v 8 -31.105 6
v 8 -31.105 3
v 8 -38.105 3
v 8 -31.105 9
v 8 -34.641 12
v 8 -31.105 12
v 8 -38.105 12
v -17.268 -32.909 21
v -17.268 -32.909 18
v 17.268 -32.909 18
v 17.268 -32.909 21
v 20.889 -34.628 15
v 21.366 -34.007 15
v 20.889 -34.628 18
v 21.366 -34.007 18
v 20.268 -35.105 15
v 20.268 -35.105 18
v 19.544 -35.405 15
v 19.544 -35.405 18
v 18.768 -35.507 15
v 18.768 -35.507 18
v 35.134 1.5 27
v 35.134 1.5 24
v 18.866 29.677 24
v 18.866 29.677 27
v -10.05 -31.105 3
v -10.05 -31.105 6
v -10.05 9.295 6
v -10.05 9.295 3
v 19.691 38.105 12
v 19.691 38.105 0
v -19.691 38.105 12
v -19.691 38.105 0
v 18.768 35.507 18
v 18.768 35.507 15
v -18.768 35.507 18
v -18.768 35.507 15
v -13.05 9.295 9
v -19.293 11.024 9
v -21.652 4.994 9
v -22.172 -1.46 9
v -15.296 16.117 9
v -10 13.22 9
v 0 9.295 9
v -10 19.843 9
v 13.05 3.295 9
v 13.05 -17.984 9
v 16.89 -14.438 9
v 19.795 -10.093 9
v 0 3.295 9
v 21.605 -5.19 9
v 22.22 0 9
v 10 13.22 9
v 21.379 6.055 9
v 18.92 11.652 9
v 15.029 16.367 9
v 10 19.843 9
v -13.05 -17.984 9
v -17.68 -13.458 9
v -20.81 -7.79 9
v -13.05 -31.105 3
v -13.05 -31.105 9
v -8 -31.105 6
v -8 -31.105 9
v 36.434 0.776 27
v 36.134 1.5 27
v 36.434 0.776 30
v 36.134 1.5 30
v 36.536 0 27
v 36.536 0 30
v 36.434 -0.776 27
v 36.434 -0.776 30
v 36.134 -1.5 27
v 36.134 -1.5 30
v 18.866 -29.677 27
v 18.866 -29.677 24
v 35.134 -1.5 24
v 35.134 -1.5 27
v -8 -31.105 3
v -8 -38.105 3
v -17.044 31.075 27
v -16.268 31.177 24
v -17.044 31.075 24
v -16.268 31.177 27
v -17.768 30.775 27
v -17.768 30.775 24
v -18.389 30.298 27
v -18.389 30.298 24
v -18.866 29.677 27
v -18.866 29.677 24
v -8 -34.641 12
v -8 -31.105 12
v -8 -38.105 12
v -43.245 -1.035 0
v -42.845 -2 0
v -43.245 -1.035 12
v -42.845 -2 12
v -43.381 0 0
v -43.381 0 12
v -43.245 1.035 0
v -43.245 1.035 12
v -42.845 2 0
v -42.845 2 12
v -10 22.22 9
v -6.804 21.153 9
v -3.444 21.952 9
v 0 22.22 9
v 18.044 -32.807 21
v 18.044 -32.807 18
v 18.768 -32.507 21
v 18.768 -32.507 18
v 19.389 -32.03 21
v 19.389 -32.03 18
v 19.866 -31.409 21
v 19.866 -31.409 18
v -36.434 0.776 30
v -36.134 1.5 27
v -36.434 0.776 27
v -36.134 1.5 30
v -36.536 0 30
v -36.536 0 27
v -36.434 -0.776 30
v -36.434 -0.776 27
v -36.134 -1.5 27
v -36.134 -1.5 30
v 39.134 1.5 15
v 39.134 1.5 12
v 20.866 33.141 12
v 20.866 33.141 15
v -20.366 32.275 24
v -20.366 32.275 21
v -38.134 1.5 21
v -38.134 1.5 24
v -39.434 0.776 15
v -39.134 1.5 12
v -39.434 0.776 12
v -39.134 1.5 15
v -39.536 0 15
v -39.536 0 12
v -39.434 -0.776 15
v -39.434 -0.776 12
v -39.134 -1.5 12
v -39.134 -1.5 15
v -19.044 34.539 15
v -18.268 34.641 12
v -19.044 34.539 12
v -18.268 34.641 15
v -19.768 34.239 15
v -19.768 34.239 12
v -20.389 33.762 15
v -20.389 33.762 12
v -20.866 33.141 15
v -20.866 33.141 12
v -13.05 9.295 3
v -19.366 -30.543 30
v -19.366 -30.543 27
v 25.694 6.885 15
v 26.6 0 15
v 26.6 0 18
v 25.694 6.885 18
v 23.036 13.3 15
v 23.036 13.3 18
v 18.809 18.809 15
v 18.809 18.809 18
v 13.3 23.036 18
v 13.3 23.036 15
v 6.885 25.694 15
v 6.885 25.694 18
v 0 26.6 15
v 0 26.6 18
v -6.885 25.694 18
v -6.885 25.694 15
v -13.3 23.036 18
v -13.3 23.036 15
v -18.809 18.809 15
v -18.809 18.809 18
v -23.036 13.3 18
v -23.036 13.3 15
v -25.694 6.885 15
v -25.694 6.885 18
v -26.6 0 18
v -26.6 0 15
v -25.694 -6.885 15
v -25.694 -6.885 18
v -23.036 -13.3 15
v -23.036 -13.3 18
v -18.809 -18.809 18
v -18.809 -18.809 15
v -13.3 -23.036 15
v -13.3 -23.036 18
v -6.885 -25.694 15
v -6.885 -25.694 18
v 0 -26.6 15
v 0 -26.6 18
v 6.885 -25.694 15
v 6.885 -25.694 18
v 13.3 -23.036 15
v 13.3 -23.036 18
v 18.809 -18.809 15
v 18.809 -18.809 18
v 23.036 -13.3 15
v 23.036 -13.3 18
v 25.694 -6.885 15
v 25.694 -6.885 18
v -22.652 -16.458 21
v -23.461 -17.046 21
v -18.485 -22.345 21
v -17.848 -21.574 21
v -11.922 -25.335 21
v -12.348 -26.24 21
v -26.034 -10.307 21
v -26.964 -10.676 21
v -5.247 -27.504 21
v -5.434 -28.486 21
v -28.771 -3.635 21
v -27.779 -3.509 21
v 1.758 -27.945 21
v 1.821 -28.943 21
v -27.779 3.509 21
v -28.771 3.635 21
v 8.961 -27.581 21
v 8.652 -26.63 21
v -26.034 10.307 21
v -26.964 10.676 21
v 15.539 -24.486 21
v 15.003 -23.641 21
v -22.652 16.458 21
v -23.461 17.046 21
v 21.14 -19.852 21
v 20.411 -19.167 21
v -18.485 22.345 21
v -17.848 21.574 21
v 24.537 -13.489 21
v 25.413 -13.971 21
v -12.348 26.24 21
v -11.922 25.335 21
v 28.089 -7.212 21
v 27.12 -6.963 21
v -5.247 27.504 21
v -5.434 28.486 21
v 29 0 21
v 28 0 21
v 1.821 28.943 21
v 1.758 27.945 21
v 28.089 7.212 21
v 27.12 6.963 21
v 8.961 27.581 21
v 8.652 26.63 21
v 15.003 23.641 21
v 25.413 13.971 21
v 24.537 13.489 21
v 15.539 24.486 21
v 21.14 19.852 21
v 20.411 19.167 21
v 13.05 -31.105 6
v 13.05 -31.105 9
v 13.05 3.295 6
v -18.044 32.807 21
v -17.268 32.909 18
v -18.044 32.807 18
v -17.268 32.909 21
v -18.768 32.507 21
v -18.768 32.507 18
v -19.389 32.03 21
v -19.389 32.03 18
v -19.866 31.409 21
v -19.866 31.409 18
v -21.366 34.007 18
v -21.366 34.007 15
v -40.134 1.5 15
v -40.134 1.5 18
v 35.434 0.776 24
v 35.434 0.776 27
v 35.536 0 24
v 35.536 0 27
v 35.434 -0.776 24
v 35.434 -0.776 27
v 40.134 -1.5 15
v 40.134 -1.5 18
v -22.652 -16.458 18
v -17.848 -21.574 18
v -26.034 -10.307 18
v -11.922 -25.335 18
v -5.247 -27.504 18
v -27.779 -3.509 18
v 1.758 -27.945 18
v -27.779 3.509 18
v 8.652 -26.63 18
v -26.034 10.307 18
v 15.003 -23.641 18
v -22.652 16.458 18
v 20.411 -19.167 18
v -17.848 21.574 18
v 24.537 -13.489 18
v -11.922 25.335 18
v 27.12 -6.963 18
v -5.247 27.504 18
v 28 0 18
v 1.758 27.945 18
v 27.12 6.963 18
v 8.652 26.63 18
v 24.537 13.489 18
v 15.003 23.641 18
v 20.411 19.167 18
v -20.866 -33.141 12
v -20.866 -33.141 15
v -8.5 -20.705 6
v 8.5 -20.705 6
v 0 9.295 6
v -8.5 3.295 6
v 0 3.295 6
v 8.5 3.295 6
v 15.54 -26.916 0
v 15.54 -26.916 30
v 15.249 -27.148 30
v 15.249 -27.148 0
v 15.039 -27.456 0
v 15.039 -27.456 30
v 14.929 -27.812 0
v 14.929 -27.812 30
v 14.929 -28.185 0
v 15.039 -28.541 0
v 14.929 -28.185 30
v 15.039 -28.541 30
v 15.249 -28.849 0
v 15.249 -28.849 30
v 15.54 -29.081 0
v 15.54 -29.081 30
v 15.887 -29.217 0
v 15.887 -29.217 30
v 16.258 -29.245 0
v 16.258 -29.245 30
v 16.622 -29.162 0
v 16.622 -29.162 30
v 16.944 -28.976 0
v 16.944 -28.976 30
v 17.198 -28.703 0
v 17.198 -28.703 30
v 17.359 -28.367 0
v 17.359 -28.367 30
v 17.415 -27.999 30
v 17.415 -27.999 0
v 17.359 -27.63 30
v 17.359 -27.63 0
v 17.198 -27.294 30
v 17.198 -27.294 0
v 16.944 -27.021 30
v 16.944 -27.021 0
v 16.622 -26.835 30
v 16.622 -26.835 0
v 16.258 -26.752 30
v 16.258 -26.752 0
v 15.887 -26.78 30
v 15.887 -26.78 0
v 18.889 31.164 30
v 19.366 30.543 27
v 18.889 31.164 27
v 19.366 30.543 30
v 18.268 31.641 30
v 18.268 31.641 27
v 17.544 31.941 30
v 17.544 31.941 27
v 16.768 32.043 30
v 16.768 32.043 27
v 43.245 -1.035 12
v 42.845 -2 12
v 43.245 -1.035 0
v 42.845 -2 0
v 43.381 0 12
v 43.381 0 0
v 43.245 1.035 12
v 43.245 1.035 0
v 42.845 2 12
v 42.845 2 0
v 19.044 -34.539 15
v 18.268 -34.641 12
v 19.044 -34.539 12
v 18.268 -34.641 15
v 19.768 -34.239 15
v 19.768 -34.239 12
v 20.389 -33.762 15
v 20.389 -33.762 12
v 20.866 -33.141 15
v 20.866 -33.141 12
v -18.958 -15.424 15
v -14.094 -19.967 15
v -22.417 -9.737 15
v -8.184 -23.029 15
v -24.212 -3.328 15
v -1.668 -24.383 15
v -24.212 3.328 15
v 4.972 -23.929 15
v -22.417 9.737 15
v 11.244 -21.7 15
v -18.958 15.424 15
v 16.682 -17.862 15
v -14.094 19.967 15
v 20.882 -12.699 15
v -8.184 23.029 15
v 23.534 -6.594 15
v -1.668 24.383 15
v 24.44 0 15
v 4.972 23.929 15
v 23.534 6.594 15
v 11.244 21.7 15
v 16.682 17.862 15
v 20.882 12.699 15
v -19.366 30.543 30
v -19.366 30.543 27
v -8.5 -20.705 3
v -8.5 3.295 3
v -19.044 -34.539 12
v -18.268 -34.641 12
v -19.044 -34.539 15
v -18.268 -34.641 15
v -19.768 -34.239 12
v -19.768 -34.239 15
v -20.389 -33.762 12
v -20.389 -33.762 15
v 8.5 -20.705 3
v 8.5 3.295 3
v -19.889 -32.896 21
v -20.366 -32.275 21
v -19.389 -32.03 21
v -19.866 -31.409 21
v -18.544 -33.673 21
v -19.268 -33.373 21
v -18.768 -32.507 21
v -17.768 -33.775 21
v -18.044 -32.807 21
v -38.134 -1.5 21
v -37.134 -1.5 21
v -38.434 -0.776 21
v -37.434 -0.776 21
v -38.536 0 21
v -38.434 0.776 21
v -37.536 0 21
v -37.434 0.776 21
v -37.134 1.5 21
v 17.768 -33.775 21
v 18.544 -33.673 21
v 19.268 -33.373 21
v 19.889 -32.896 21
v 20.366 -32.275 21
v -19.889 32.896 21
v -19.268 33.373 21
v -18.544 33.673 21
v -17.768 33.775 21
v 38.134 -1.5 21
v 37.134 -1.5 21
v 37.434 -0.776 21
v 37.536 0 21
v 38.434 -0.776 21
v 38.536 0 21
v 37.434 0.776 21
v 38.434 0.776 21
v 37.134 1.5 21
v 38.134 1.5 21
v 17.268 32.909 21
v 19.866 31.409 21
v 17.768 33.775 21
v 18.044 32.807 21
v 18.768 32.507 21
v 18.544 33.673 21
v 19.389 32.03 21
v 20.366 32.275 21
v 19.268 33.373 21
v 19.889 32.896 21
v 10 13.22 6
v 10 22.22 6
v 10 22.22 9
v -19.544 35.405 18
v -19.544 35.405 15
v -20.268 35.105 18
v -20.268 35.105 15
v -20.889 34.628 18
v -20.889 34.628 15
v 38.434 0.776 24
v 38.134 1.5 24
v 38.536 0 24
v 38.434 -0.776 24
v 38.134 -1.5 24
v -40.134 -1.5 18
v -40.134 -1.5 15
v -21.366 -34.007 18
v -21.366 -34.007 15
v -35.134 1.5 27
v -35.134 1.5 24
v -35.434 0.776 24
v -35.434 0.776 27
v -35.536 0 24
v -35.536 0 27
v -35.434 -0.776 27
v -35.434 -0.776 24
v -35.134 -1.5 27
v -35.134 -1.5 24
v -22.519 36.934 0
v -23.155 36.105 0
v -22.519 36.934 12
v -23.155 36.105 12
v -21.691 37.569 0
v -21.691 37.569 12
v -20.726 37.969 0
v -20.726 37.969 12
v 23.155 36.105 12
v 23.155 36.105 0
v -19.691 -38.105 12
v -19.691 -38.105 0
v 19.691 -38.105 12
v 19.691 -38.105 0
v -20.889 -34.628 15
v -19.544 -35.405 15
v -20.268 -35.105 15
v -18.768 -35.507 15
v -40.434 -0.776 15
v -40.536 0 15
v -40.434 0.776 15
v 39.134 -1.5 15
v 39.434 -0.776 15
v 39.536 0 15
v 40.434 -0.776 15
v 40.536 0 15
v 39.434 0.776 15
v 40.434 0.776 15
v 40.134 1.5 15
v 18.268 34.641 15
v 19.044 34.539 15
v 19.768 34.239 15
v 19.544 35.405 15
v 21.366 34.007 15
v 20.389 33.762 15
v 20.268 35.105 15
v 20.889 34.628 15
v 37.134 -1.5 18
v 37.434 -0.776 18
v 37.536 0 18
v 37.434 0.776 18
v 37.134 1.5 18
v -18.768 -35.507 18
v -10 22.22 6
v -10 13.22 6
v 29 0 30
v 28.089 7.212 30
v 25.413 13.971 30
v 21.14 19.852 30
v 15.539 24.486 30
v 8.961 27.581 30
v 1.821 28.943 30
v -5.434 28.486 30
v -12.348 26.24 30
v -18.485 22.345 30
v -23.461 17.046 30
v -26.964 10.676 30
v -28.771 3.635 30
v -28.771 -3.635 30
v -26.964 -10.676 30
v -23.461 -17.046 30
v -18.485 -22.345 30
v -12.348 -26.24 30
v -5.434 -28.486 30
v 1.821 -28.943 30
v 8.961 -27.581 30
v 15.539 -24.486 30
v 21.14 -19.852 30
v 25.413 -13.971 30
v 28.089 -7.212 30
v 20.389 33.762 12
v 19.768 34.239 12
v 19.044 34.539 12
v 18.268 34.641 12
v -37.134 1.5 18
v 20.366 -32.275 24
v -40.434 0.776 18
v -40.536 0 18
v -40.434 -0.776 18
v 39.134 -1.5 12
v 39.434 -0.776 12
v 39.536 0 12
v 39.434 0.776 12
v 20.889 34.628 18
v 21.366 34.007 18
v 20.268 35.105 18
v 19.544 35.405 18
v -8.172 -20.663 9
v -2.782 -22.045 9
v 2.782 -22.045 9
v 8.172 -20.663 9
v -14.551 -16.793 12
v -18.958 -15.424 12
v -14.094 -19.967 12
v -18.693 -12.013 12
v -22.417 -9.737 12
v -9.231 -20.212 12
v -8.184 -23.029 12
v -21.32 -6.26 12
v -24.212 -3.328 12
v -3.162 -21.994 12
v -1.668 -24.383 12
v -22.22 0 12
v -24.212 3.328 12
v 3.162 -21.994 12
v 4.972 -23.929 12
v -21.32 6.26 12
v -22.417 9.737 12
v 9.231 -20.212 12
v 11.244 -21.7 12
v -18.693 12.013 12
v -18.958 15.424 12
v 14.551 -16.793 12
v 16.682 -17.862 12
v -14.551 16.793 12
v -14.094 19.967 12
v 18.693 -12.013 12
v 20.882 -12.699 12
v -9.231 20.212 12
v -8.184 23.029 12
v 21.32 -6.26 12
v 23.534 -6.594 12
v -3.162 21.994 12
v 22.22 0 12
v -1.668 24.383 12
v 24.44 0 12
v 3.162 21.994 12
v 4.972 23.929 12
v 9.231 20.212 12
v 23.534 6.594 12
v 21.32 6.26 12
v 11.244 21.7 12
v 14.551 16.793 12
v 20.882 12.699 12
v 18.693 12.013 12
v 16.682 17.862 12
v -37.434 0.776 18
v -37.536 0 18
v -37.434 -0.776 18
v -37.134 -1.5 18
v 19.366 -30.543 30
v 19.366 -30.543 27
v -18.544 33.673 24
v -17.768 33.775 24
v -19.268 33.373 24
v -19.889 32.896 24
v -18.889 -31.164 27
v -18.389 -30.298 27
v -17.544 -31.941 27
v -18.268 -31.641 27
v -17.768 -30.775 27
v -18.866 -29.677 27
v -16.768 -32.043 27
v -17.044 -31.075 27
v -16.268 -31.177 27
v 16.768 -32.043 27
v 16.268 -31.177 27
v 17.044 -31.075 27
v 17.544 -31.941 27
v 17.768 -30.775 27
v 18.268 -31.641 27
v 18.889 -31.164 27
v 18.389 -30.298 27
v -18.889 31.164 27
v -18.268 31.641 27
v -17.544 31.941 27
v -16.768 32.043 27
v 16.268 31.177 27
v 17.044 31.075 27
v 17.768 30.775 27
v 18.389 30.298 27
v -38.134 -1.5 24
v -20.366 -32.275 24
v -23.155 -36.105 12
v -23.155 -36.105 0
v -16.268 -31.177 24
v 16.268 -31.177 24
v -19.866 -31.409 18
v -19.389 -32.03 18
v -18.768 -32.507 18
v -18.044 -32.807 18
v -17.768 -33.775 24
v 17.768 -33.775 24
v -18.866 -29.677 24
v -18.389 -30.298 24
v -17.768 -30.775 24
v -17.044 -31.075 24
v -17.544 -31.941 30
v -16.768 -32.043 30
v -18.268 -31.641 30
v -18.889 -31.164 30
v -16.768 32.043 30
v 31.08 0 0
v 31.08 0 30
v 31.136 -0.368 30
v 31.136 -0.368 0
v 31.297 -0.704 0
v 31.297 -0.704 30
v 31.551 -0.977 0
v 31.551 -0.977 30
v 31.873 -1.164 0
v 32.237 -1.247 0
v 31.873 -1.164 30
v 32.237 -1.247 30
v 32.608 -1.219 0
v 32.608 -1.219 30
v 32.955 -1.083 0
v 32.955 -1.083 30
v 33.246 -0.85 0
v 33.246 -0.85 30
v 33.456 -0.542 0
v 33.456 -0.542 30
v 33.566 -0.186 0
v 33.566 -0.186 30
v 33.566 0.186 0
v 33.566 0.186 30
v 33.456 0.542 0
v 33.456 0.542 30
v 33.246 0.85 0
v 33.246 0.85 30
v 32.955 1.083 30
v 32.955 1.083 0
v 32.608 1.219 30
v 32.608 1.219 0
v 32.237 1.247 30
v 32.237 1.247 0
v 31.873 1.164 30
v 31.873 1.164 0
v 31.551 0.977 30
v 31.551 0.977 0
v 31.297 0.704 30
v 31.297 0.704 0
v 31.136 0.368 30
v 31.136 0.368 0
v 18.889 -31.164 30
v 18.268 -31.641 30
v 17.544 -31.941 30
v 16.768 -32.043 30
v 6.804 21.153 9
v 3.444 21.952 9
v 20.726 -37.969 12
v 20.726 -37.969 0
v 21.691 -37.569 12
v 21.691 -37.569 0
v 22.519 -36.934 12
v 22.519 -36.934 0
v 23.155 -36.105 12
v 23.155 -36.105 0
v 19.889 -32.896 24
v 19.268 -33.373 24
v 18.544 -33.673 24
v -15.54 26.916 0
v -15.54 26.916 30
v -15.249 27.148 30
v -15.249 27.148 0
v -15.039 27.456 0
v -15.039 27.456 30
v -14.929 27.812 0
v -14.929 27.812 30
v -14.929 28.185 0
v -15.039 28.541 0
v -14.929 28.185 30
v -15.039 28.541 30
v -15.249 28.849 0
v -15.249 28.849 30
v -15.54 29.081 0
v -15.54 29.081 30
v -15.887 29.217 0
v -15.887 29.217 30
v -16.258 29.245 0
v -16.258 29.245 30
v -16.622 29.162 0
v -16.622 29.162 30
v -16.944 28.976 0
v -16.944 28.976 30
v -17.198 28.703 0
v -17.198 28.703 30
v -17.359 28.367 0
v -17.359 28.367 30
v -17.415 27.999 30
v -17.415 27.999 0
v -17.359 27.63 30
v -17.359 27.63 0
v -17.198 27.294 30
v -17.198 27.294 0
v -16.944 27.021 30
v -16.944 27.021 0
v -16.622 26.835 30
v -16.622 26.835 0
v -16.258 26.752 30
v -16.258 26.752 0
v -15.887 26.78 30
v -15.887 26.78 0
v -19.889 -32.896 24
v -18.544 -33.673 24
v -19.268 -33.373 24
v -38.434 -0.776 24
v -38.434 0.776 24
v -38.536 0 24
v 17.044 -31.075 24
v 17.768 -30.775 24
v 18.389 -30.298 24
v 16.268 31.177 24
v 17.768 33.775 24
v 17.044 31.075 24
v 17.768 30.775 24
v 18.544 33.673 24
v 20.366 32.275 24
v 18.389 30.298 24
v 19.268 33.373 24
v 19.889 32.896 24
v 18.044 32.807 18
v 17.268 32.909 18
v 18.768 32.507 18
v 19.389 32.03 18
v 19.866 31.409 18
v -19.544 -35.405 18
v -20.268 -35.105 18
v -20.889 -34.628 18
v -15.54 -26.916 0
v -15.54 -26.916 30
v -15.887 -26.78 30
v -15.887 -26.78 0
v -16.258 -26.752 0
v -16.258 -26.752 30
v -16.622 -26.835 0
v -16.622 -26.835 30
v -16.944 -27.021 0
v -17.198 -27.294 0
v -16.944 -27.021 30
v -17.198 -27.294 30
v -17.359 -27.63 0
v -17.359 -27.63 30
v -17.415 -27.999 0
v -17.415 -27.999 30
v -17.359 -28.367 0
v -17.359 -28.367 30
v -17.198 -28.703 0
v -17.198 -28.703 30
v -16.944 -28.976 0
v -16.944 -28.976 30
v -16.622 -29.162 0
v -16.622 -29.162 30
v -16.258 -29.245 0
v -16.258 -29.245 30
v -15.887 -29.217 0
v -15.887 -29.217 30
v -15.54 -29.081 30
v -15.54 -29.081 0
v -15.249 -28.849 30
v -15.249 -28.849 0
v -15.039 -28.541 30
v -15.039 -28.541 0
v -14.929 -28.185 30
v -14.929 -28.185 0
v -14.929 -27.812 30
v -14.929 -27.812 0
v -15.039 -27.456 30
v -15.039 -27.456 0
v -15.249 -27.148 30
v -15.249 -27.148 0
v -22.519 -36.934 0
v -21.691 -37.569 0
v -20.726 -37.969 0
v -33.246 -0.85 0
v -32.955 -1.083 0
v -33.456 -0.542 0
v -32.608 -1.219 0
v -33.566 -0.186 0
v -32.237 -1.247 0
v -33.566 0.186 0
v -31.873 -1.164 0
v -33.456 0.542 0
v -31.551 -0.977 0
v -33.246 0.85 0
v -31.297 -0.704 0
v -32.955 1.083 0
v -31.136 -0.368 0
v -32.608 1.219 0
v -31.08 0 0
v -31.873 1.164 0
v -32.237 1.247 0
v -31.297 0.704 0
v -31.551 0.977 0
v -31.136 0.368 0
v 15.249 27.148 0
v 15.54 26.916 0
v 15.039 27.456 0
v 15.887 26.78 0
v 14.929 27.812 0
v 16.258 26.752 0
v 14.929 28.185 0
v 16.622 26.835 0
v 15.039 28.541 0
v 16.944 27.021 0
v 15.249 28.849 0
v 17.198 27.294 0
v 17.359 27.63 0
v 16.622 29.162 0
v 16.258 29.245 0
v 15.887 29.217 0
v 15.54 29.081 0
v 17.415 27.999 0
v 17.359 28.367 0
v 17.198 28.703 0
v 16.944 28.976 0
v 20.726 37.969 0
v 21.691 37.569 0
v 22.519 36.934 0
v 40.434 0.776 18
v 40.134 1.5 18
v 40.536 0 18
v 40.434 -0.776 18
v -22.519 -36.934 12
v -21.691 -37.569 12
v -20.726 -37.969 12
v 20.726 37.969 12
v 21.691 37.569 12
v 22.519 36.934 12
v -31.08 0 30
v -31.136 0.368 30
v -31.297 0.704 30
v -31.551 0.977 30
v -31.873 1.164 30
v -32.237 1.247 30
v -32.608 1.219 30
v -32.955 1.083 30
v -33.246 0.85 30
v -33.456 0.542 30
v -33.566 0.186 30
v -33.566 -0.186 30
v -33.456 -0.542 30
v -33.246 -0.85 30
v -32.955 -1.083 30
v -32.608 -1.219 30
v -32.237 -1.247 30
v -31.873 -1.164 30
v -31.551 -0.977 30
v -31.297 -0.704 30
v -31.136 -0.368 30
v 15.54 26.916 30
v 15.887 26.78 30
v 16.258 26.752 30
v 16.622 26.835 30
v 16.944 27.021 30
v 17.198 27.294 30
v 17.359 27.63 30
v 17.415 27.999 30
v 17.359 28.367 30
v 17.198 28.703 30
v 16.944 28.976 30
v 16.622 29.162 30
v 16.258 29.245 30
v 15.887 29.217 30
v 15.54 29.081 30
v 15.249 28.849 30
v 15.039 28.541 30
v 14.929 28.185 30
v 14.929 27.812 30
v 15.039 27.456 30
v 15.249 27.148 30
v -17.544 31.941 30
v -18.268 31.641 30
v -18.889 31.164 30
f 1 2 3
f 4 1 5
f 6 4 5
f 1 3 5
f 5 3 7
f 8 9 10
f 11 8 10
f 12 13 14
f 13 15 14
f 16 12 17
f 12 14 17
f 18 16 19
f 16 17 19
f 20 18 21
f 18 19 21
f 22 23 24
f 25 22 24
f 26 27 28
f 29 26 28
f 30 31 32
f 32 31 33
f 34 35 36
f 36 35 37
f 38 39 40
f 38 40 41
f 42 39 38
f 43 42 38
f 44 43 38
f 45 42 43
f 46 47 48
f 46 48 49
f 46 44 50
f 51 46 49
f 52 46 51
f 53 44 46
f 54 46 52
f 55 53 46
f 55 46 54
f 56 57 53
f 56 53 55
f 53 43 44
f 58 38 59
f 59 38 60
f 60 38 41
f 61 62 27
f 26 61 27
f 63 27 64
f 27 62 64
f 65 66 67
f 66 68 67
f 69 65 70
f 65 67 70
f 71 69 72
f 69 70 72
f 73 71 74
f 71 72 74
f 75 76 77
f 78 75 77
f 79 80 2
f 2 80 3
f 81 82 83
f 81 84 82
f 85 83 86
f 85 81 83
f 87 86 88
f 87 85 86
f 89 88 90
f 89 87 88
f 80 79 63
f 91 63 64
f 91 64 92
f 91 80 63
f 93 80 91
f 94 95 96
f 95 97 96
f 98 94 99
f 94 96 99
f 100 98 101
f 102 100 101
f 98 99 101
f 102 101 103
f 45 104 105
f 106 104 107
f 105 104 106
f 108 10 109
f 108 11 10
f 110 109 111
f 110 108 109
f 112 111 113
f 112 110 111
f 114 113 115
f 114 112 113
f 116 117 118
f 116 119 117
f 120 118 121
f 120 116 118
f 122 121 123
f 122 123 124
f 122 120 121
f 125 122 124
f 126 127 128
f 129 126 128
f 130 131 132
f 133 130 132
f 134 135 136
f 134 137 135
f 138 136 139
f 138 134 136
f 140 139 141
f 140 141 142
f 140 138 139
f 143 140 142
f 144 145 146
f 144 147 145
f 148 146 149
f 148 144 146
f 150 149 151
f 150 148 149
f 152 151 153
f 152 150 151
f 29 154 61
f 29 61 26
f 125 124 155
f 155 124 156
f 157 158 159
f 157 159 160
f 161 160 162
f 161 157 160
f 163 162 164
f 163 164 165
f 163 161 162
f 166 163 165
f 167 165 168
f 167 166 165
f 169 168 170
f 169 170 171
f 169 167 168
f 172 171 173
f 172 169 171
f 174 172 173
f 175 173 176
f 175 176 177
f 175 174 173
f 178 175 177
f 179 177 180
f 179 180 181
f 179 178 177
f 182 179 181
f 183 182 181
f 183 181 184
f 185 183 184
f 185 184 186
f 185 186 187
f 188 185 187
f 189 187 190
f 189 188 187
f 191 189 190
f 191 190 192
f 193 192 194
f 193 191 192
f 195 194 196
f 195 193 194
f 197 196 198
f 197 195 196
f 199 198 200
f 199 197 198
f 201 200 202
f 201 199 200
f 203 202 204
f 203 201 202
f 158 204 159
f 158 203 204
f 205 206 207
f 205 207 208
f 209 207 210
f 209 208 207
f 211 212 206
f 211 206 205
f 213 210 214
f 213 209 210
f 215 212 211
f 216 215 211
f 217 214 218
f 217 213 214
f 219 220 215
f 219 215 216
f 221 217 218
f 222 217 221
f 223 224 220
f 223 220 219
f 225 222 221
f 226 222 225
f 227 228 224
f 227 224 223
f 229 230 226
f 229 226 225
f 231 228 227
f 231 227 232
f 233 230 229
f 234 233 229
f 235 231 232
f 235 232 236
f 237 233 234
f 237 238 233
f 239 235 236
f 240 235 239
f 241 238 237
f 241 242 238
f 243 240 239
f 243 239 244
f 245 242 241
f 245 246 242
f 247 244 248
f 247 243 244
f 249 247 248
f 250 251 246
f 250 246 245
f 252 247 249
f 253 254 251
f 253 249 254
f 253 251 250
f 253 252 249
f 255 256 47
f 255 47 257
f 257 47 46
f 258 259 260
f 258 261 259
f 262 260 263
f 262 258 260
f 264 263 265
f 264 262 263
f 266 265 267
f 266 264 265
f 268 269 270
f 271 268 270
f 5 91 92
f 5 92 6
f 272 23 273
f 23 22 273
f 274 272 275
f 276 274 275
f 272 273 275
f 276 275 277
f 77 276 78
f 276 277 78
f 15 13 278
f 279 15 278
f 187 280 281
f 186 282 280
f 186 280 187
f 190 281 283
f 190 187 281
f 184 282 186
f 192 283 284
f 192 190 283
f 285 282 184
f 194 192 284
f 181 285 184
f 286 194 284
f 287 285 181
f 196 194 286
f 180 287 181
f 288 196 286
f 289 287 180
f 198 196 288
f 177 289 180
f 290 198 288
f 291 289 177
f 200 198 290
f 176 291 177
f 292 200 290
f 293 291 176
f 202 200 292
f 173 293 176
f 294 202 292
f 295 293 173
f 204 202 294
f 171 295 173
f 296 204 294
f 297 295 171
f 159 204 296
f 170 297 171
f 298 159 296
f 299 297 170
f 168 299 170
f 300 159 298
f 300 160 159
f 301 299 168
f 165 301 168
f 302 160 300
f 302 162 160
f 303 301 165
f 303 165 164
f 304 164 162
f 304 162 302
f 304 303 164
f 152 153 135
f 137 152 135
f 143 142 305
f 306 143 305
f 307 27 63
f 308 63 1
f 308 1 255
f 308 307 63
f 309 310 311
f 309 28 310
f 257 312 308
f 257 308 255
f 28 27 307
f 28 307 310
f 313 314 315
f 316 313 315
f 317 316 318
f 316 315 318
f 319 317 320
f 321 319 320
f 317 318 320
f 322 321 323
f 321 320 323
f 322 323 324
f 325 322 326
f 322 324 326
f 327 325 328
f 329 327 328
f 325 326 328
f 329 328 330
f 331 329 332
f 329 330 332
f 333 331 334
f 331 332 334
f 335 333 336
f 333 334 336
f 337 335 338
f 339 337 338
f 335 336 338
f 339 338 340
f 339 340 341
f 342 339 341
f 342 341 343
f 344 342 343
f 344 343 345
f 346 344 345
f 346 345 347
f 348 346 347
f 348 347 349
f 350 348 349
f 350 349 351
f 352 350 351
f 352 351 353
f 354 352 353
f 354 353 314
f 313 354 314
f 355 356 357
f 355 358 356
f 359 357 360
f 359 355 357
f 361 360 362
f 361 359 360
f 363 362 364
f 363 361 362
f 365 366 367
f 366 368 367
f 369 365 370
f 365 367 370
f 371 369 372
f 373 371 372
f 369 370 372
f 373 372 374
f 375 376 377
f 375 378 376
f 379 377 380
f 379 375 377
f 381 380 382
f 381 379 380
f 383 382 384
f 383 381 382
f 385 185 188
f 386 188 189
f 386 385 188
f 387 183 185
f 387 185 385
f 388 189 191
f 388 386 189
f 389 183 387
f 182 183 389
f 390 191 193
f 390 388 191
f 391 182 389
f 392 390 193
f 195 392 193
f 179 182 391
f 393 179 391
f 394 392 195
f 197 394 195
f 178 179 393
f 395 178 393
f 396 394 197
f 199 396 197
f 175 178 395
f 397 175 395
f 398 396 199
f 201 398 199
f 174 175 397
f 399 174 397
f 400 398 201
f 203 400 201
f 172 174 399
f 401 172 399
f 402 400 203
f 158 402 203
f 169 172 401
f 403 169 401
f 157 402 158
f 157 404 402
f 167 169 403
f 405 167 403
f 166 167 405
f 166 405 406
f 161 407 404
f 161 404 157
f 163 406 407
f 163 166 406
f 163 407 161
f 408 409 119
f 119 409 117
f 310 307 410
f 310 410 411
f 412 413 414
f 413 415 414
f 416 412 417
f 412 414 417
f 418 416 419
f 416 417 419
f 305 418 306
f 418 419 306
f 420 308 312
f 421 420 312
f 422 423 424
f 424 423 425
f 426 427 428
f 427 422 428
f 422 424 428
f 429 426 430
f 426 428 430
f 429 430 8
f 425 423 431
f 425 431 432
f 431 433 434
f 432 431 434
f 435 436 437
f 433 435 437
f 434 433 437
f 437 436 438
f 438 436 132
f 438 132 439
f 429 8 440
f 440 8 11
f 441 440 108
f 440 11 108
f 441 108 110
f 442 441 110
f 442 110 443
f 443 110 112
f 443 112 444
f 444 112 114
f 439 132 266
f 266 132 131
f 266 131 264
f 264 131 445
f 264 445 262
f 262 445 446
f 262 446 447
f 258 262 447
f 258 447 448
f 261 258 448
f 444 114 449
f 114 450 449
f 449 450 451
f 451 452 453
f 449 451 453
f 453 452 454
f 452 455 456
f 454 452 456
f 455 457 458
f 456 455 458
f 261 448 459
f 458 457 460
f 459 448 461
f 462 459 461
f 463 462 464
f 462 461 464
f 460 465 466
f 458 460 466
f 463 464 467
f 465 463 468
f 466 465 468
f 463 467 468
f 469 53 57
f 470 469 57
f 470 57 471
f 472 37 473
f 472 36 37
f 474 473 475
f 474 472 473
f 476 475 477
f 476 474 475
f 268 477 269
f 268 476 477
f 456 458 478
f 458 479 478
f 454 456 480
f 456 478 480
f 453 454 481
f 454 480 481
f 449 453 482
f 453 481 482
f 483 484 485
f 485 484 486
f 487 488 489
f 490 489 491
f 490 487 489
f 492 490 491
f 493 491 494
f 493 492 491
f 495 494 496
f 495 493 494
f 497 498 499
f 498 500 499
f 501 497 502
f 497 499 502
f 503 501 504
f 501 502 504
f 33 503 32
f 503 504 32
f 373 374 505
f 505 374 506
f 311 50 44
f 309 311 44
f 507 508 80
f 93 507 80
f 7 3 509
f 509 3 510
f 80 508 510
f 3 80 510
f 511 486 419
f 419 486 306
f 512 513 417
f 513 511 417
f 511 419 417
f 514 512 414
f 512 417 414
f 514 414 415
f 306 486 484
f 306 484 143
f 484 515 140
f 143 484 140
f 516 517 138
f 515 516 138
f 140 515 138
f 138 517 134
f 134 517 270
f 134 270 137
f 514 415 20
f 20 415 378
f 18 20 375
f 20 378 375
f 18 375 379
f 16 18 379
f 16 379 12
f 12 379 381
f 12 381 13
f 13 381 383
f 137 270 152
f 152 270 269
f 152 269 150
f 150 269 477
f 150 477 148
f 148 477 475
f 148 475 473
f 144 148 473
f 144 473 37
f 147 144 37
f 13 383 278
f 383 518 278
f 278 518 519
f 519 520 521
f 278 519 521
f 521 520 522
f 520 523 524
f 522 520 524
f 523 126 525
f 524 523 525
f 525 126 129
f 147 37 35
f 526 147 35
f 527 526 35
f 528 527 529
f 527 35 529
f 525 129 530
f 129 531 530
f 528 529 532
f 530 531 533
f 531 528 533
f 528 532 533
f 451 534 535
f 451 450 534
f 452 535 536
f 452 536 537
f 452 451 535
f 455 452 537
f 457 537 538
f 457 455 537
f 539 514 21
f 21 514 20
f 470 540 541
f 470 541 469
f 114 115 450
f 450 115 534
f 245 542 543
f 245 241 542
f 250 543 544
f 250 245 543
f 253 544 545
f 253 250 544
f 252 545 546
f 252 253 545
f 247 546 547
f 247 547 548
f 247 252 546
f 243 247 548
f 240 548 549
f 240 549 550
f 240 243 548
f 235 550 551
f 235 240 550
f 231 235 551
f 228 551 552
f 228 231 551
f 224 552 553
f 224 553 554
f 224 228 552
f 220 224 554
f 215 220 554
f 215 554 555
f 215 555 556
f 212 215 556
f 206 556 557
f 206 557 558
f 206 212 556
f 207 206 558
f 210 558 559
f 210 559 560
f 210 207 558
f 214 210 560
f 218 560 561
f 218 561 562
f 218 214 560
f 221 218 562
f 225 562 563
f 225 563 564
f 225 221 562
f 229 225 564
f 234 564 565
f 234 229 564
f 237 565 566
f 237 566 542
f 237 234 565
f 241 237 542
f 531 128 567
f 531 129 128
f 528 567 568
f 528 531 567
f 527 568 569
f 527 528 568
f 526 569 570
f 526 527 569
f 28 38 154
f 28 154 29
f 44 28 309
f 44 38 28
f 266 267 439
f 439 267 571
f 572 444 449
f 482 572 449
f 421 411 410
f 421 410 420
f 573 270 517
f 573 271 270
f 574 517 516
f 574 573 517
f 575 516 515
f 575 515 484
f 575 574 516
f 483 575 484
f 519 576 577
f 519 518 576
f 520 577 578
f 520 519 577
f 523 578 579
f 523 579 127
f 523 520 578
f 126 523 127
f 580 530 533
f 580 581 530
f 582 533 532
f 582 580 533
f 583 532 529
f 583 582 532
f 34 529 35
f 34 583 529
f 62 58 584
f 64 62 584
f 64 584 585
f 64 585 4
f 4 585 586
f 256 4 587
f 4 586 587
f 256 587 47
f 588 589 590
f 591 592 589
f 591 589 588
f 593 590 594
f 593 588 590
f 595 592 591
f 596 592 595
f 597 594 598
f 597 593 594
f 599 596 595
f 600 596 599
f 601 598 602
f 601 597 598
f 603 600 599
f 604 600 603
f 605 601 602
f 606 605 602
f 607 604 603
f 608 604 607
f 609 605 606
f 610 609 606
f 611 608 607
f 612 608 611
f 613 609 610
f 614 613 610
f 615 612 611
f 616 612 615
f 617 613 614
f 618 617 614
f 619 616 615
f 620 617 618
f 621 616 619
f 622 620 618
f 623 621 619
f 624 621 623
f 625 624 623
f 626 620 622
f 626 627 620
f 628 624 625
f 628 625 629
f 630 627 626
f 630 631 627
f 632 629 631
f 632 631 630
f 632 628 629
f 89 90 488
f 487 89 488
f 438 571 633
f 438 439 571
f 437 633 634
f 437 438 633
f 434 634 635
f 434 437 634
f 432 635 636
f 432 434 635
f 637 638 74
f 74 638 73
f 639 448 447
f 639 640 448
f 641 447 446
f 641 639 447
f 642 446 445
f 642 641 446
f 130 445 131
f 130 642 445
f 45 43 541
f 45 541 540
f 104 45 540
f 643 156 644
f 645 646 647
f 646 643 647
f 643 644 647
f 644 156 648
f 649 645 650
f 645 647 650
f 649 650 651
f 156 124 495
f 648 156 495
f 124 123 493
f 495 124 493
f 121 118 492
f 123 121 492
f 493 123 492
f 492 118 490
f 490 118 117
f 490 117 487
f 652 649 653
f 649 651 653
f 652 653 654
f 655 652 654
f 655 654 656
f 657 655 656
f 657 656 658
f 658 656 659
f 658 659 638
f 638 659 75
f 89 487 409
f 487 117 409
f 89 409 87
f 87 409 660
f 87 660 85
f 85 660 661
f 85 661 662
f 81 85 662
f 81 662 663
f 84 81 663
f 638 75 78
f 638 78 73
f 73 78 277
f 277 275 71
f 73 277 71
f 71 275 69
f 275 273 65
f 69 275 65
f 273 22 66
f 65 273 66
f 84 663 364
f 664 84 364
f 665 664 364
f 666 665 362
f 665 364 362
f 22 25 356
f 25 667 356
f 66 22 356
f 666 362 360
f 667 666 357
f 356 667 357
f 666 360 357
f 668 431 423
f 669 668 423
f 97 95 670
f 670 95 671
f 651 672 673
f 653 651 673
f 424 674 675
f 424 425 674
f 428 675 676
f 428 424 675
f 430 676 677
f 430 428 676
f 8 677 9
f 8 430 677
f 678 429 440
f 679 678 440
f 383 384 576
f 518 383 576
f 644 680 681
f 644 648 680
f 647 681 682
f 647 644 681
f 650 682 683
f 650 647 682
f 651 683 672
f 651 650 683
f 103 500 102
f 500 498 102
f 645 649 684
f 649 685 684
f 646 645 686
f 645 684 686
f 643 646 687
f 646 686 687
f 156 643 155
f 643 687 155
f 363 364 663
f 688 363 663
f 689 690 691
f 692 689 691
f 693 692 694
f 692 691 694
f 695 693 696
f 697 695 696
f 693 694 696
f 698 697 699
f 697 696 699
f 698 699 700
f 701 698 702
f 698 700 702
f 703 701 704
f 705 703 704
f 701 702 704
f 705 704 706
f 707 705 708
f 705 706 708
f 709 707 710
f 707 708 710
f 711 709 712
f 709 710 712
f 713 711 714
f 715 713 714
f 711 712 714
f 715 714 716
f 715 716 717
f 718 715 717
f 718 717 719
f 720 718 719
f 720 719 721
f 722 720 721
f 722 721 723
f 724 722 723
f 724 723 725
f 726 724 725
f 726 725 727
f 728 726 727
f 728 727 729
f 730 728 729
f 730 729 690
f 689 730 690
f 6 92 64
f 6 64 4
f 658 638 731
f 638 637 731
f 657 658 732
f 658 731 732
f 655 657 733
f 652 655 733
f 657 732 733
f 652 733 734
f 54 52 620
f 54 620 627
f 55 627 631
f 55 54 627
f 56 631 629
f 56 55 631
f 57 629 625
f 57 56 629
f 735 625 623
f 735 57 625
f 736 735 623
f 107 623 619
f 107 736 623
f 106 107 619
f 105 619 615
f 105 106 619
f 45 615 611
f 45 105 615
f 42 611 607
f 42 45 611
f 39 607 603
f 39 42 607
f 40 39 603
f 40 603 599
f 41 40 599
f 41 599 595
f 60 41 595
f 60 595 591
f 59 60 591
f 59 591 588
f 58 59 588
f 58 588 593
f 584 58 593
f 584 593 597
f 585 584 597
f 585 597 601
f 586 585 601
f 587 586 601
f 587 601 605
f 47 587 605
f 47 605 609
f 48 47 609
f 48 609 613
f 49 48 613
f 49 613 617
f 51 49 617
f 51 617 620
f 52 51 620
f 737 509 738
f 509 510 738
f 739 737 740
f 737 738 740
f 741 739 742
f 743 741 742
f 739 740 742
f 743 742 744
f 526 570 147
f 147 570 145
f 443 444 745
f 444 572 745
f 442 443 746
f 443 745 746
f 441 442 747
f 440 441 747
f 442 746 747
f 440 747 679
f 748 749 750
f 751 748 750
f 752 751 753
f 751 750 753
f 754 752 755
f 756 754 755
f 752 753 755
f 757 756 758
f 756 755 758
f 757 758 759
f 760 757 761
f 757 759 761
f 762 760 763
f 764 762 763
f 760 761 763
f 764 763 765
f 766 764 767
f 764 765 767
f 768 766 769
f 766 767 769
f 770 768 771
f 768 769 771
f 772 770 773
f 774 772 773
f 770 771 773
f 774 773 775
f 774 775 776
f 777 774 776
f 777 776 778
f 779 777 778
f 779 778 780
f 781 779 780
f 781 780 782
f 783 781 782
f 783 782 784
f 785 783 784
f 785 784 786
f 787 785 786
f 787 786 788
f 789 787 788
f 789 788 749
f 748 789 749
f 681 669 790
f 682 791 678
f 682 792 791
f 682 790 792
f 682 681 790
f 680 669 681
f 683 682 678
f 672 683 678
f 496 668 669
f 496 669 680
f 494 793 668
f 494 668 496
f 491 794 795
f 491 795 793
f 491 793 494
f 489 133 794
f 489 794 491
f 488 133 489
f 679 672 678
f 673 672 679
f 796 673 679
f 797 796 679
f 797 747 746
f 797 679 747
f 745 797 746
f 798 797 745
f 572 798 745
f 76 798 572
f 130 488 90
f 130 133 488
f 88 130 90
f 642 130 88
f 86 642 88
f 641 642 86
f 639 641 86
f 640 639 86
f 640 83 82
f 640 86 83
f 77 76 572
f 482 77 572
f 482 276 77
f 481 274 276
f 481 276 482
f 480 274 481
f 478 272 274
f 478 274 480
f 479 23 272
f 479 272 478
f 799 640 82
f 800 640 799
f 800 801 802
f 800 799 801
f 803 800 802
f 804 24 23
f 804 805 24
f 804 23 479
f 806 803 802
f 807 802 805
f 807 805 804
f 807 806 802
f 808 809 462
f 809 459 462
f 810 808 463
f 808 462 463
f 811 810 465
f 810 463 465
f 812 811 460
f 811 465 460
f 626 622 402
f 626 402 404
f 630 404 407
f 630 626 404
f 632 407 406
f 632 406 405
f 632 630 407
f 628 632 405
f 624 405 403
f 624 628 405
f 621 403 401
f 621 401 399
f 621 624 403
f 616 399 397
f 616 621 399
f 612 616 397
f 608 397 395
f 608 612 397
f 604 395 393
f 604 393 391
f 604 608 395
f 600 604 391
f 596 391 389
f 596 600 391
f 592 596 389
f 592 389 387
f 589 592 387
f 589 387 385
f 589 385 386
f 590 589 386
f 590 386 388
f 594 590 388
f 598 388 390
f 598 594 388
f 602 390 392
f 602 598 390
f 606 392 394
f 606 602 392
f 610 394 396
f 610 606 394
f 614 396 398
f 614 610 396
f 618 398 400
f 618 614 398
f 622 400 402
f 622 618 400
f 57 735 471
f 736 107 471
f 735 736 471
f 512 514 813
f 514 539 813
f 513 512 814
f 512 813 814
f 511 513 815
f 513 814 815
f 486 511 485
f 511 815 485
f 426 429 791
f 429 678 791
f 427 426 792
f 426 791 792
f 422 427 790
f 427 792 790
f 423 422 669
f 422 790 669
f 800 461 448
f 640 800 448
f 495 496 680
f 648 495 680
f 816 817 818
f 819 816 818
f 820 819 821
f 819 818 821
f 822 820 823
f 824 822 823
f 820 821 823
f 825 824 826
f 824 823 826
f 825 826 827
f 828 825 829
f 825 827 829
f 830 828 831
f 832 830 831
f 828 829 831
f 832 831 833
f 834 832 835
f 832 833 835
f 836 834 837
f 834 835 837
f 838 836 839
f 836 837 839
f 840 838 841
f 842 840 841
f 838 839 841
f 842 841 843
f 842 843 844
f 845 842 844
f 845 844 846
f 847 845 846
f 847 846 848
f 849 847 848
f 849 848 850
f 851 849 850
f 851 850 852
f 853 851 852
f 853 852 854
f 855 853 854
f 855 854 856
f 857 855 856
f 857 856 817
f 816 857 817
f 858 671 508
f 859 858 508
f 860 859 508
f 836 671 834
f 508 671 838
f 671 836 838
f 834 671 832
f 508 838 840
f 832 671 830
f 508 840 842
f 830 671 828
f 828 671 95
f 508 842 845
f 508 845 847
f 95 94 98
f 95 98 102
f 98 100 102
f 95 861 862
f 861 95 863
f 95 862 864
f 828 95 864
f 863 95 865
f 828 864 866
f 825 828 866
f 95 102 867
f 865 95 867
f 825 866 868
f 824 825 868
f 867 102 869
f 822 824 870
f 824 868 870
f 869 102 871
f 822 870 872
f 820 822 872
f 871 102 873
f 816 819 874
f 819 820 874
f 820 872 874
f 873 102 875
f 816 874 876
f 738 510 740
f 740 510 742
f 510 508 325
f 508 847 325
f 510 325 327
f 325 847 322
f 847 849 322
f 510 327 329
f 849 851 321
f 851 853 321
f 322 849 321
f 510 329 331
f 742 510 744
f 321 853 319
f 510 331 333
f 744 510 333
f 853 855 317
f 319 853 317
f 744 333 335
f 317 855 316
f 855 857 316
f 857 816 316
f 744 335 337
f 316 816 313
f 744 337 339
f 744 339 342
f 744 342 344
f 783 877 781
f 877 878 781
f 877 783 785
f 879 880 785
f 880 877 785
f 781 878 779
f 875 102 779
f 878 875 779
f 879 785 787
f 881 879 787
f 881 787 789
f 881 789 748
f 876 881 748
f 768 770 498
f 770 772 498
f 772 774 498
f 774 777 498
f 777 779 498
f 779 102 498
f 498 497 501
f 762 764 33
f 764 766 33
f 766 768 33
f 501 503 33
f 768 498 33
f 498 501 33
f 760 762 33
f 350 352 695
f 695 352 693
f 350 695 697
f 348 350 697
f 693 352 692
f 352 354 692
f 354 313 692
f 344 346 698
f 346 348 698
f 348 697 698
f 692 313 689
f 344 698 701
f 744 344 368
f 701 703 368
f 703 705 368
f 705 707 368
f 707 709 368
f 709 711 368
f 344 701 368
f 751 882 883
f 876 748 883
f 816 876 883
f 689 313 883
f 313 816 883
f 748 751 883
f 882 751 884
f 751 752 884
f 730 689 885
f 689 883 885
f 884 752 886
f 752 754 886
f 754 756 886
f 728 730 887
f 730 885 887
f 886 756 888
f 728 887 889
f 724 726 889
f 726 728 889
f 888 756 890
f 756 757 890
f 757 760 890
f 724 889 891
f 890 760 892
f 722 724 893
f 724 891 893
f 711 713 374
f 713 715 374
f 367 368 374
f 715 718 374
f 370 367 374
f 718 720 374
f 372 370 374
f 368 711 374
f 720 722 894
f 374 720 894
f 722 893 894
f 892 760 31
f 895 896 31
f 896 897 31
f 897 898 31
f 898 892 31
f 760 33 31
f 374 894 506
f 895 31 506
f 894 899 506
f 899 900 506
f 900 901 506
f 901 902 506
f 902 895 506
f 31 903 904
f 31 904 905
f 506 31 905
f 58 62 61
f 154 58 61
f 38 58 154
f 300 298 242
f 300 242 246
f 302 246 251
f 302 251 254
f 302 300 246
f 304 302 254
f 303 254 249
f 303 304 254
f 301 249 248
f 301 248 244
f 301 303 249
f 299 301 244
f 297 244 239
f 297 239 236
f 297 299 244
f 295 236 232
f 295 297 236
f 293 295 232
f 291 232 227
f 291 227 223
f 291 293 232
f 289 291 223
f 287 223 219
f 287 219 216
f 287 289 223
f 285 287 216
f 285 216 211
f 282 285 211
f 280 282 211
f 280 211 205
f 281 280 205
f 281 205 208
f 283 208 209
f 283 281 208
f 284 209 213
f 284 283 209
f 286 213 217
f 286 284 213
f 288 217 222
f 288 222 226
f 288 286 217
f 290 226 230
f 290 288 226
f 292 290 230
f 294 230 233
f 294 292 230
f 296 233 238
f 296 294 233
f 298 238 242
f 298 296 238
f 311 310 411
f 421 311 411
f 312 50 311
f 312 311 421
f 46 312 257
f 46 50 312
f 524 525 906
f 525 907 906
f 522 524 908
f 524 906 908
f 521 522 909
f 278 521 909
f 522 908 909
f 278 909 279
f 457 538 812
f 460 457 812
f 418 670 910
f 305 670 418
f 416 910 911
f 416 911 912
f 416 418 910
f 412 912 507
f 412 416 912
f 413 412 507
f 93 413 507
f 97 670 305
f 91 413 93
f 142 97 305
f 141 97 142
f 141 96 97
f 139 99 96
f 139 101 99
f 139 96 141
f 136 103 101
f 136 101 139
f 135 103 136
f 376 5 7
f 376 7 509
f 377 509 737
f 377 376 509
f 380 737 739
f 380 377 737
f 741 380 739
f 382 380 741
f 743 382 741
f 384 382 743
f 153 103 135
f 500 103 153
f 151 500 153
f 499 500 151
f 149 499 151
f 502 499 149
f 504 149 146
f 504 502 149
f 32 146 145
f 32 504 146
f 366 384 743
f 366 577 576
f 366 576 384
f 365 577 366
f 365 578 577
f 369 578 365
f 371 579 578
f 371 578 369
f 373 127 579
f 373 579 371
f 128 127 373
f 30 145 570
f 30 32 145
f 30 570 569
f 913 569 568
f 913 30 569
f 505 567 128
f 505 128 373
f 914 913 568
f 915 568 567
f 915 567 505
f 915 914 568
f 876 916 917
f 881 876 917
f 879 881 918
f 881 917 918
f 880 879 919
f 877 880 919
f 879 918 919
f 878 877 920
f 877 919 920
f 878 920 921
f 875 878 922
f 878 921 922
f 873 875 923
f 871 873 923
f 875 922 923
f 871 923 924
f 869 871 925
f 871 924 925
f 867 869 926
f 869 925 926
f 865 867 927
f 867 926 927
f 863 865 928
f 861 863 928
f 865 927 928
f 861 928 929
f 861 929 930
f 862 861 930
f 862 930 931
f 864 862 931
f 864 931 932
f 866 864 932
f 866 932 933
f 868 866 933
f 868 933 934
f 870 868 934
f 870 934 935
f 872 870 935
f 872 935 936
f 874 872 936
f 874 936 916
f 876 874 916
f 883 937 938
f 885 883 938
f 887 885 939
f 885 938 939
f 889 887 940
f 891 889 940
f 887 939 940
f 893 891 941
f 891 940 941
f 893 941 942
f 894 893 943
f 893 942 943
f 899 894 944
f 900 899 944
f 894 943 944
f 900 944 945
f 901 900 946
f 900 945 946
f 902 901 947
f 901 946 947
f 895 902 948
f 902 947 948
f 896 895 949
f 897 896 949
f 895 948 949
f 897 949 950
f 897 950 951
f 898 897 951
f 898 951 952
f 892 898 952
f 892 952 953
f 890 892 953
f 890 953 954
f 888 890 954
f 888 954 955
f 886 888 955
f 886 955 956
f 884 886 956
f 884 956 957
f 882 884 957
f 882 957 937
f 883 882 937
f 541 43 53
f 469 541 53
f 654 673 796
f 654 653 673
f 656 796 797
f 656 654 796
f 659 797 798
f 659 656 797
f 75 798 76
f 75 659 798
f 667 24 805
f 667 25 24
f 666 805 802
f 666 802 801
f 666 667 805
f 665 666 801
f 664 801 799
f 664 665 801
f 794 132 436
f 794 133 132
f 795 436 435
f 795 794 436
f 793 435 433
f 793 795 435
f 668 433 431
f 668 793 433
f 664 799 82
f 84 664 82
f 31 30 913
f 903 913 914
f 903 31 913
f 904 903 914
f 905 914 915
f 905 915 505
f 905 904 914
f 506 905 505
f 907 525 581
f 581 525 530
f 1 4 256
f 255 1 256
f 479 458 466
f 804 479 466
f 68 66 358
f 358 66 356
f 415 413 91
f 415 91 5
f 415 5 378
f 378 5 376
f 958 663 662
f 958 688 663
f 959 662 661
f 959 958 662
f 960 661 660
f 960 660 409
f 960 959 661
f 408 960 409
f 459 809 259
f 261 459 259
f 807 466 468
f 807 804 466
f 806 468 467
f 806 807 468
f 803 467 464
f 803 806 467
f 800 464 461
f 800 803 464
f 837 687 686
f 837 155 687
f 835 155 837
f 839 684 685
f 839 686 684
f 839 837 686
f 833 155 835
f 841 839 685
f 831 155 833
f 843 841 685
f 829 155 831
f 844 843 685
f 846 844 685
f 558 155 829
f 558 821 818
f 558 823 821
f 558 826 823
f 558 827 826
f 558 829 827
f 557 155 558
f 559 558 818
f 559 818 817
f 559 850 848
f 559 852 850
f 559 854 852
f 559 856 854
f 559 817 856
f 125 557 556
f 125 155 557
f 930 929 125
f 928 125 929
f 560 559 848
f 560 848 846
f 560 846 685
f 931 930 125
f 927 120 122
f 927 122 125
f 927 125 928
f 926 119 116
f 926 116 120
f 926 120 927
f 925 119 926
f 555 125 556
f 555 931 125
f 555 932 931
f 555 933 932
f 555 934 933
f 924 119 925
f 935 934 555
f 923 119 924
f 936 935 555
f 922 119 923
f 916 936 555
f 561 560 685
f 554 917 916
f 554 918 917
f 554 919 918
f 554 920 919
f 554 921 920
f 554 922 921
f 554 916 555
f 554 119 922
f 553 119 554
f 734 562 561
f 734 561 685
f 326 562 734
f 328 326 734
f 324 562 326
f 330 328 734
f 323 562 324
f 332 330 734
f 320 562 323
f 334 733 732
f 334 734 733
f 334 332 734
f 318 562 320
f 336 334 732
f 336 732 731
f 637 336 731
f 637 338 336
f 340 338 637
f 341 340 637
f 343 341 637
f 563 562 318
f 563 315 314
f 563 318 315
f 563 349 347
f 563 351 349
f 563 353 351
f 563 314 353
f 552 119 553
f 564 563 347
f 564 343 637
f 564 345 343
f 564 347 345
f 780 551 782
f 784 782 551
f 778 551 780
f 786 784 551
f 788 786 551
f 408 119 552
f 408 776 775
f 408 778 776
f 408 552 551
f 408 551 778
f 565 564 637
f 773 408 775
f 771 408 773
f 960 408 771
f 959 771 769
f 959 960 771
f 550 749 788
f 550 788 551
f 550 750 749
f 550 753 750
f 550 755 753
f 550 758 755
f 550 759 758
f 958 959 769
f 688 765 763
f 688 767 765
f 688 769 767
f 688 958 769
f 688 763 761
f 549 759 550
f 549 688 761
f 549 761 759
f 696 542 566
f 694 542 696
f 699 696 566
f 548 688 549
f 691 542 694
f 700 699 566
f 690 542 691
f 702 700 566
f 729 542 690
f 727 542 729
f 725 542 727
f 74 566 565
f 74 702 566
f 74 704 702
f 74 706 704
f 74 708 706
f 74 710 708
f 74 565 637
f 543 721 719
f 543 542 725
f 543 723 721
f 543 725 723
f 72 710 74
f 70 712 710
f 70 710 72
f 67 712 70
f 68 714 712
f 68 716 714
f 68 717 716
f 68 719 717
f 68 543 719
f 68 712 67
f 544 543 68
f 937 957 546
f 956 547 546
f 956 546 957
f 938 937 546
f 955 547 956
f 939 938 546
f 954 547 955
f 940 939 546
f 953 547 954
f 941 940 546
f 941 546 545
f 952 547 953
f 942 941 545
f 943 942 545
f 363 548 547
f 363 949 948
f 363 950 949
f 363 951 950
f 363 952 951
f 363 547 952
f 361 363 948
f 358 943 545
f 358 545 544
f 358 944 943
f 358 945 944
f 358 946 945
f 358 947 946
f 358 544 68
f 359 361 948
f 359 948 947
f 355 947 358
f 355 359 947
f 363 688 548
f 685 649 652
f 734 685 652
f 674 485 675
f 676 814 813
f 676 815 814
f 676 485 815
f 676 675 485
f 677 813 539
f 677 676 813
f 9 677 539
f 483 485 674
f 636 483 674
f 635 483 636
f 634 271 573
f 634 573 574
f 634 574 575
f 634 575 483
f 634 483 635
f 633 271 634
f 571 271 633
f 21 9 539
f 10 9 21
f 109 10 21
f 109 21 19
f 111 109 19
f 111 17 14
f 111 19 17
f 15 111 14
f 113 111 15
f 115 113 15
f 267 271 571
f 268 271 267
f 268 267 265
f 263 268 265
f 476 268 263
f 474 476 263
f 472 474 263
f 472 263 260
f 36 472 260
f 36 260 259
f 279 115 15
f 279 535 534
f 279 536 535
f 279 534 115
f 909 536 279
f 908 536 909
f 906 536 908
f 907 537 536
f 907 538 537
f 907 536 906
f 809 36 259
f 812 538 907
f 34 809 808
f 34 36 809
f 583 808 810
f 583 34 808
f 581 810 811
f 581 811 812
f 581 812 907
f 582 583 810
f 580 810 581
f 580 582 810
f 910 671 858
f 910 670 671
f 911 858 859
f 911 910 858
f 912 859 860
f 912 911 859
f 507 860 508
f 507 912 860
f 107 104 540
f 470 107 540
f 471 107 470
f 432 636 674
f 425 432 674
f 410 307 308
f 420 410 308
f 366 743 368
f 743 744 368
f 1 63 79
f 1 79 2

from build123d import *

# Parameters (mm, degrees)
PAD_DEPTH          = 9
SKETCH001_W        = 26.1
SKETCH001_H        = 34.4
POCKET_DEPTH       = 3
SKETCH002_R        = 22.22
PAD001_DEPTH       = 3
SKETCH003_R        = 24.44
PAD002_DEPTH       = 3
SKETCH004_R        = 26.6
PAD003_DEPTH       = 3
SKETCH005_R        = 28
PAD004_DEPTH       = 3
SKETCH006_R        = 29
PAD005_DEPTH       = 3
SKETCH007_R        = 29
PAD006_DEPTH       = 3
SKETCH008_R        = 29
PAD007_DEPTH       = 3
SKETCH009_W        = 17
SKETCH009_H        = 24
POCKET001_DEPTH    = 3
SKETCH010_W        = 16
SKETCH010_H        = 9
POCKET002_DEPTH    = 7
SKETCH011_W        = 20
SKETCH011_H        = 9
POCKET003_DEPTH    = 3
SKETCH012_R        = 1.25
POCKET004_DEPTH    = 270.433943
POLARPATTERN_COUNT = 6
SKETCH013_W        = 3
SKETCH013_H        = 38
POCKET005_DEPTH    = 3
SKETCH014_W        = 3
SKETCH014_H        = 6
POCKET006_DEPTH    = 6
SKETCH015_W        = 10.05
SKETCH015_H        = 6
POCKET007_DEPTH    = 3
FILLET_R           = 4
FILLET001_R        = 3
FILLET002_R        = 3
FILLET003_R        = 3
FILLET004_R        = 3


with BuildPart() as part:
    # Sketch → Pad (new body)
    with BuildSketch(Plane.XY):
        Polygon((44, 0), (22, 38.105118), (-22, 38.105118), (-44, 0), (-22, -38.105118), (22, -38.105118), align=None)
    extrude(amount=PAD_DEPTH)

    # Sketch001 (on Face8 of Pad) → Pocket (cut)
    with BuildSketch(Plane.XY.offset(9)):
        with Locations((0, -13.905118)):
            Rectangle(SKETCH001_W, SKETCH001_H)
    extrude(amount=-POCKET_DEPTH, mode=Mode.SUBTRACT)

    # Sketch002 (on Face5 of Pocket) → Pad001 (join)
    with BuildSketch(Plane.XY.offset(9)):
        Polygon((22, 38.105118), (-22, 38.105118), (-44, 0), (-22, -38.105118), (22, -38.105118), (44, 0), align=None)
        Circle(SKETCH002_R, mode=Mode.SUBTRACT)
    extrude(amount=PAD001_DEPTH)

    # Sketch003 (on Face14 of Pad001) → Pad002 (join)
    with BuildSketch(Plane.XY.offset(12)):
        Polygon((40, 0), (20, 34.641016), (-20, 34.641016), (-40, 0), (-20, -34.641016), (20, -34.641016), align=None)
        Circle(SKETCH003_R, mode=Mode.SUBTRACT)
    extrude(amount=PAD002_DEPTH)

    # Sketch004 (on Face21 of Pad002) → Pad003 (join)
    with BuildSketch(Plane.XY.offset(15)):
        Polygon((41, 0), (20.5, 35.507042), (-20.5, 35.507042), (-41, 0), (-20.5, -35.507042), (20.5, -35.507042), align=None)
        Circle(SKETCH004_R, mode=Mode.SUBTRACT)
    extrude(amount=PAD003_DEPTH)

    # Sketch005 (on Face28 of Pad003) → Pad004 (join)
    with BuildSketch(Plane.XY.offset(18)):
        Polygon((19, 32.908965), (-19, 32.908965), (-38, 0), (-19, -32.908965), (19, -32.908965), (38, 0), align=None)
        Circle(SKETCH005_R, mode=Mode.SUBTRACT)
    extrude(amount=PAD004_DEPTH)

    # Sketch006 (on Face35 of Pad004) → Pad005 (join)
    with BuildSketch(Plane.XY.offset(21)):
        Polygon((39, 0), (19.5, 33.774991), (-19.5, 33.774991), (-39, 0), (-19.5, -33.774991), (19.5, -33.774991), align=None)
        Circle(SKETCH006_R, mode=Mode.SUBTRACT)
    extrude(amount=PAD005_DEPTH)

    # Sketch007 (on Face42 of Pad005) → Pad006 (join)
    with BuildSketch(Plane.XY.offset(24)):
        Polygon((36, 0), (18, 31.176915), (-18, 31.176915), (-36, 0), (-18, -31.176915), (18, -31.176915), align=None)
        Circle(SKETCH007_R, mode=Mode.SUBTRACT)
    extrude(amount=PAD006_DEPTH)

    # Sketch008 (on Face49 of Pad006) → Pad007 (join)
    with BuildSketch(Plane.XY.offset(27)):
        Polygon((37, 0), (18.5, 32.04294), (-18.5, 32.04294), (-37, 0), (-18.5, -32.04294), (18.5, -32.04294), align=None)
        Circle(SKETCH008_R, mode=Mode.SUBTRACT)
    extrude(amount=PAD007_DEPTH)

    # Sketch009 (on Face74 of Pad007) → Pocket001 (cut)
    with BuildSketch(Plane.XY.offset(6)):
        with Locations((0, -8.705118)):
            Rectangle(SKETCH009_W, SKETCH009_H)
    extrude(amount=-POCKET001_DEPTH, mode=Mode.SUBTRACT)

    # Sketch010 (on Face12 of Pocket001) → Pocket002 (cut)
    with BuildSketch(Plane.XZ.offset(38.105118)):
        with Locations((0, 7.5)):
            Rectangle(SKETCH010_W, SKETCH010_H)
    extrude(amount=-POCKET002_DEPTH, mode=Mode.SUBTRACT)

    # Sketch011 (on Face40 of Pocket002) → Pocket003 (cut)
    with BuildSketch(Plane.XY.offset(9)):
        with Locations((0, 17.72)):
            Rectangle(SKETCH011_W, SKETCH011_H)
    extrude(amount=-POCKET003_DEPTH, mode=Mode.SUBTRACT)

    # Sketch012 (on Face93 of Pocket003) → Pocket004 (cut, through all)
    with BuildSketch(Plane.XY.offset(30)):
        with Locations((-32.33, 0)):
            Circle(SKETCH012_R)
    pocket004 = extrude(amount=-POCKET004_DEPTH, mode=Mode.SUBTRACT)

    # PolarPattern: Pocket004 ×6 about axis
    polarpattern_axis = Axis((0, 0, 30), (0, 0, 1))
    for i in range(1, POLARPATTERN_COUNT):
        add(pocket004.rotate(polarpattern_axis, i * 360 / POLARPATTERN_COUNT), mode=Mode.SUBTRACT)

    # Sketch013 (on Face45 of PolarPattern) → Pocket005 (cut)
    with BuildSketch(Plane.XY.offset(6)):
        with Locations((-11.55, -12.105118)):
            Rectangle(SKETCH013_W, SKETCH013_H)
    extrude(amount=-POCKET005_DEPTH, mode=Mode.SUBTRACT)

    # Sketch014 (on Face58 of Pocket005) → Pocket006 (cut)
    with BuildSketch(Plane.XY.offset(9)):
        with Locations((-11.55, 6.294882)):
            Rectangle(SKETCH014_W, SKETCH014_H)
    extrude(amount=-POCKET006_DEPTH, mode=Mode.SUBTRACT)

    # Sketch015 (on Face58 of Pocket006) → Pocket007 (cut)
    with BuildSketch(Plane.XY.offset(9)):
        with Locations((-5.025, 6.294882)):
            Rectangle(SKETCH015_W, SKETCH015_H)
    extrude(amount=-POCKET007_DEPTH, mode=Mode.SUBTRACT)

    # Fillet
    fillet_edges = [part.edges().sort_by_distance(p)[0] for p in [
        (22, -38.105118, 4.5),
        (44, 0, 4.5),
        (22, 38.105118, 4.5),
        (-22, 38.105118, 4.5),
        (-44, 0, 4.5),
        (-22, -38.105118, 4.5),
    ]]
    fillet(fillet_edges, radius=FILLET_R)

    # Fillet001
    fillet001_edges = [part.edges().sort_by_distance(p)[0] for p in [
        (20.5, -35.507042, 16.5),
        (41, 0, 16.5),
        (20.5, 35.507042, 16.5),
        (-20.5, 35.507042, 16.5),
        (-41, 0, 16.5),
        (-20.5, -35.507042, 16.5),
    ]]
    fillet(fillet001_edges, radius=FILLET001_R)

    # Fillet002
    fillet002_edges = [part.edges().sort_by_distance(p)[0] for p in [
        (19.5, -33.774991, 22.5),
        (-19.5, -33.774991, 22.5),
        (-39, 0, 22.5),
        (-19.5, 33.774991, 22.5),
        (19.5, 33.774991, 22.5),
        (39, 0, 22.5),
    ]]
    fillet(fillet002_edges, radius=FILLET002_R)

    # Fillet003
    fillet003_edges = [part.edges().sort_by_distance(p)[0] for p in [
        (-18.5, -32.04294, 28.5),
        (18.5, -32.04294, 28.5),
        (37, 0, 28.5),
        (-37, 0, 28.5),
        (18.5, 32.04294, 28.5),
        (-18.5, 32.04294, 28.5),
    ]]
    fillet(fillet003_edges, radius=FILLET003_R)

    # Fillet004
    fillet004_edges = [part.edges().sort_by_distance(p)[0] for p in [
        (-20, -34.641016, 13.5),
        (20, -34.641016, 13.5),
        (40, 0, 13.5),
        (-40, 0, 13.5),
        (-38, 0, 19.5),
        (-19, -32.908965, 19.5),
        (19, -32.908965, 19.5),
        (38, 0, 19.5),
        (36, 0, 25.5),
        (18, -31.176915, 25.5),
        (-18, -31.176915, 25.5),
        (-36, 0, 25.5),
        (18, 31.176915, 25.5),
        (-18, 31.176915, 25.5),
        (-19, 32.908965, 19.5),
        (-20, 34.641016, 13.5),
        (20, 34.641016, 13.5),
        (19, 32.908965, 19.5),
    ]]
    fillet(fillet004_edges, radius=FILLET004_R)


solid = part.part
